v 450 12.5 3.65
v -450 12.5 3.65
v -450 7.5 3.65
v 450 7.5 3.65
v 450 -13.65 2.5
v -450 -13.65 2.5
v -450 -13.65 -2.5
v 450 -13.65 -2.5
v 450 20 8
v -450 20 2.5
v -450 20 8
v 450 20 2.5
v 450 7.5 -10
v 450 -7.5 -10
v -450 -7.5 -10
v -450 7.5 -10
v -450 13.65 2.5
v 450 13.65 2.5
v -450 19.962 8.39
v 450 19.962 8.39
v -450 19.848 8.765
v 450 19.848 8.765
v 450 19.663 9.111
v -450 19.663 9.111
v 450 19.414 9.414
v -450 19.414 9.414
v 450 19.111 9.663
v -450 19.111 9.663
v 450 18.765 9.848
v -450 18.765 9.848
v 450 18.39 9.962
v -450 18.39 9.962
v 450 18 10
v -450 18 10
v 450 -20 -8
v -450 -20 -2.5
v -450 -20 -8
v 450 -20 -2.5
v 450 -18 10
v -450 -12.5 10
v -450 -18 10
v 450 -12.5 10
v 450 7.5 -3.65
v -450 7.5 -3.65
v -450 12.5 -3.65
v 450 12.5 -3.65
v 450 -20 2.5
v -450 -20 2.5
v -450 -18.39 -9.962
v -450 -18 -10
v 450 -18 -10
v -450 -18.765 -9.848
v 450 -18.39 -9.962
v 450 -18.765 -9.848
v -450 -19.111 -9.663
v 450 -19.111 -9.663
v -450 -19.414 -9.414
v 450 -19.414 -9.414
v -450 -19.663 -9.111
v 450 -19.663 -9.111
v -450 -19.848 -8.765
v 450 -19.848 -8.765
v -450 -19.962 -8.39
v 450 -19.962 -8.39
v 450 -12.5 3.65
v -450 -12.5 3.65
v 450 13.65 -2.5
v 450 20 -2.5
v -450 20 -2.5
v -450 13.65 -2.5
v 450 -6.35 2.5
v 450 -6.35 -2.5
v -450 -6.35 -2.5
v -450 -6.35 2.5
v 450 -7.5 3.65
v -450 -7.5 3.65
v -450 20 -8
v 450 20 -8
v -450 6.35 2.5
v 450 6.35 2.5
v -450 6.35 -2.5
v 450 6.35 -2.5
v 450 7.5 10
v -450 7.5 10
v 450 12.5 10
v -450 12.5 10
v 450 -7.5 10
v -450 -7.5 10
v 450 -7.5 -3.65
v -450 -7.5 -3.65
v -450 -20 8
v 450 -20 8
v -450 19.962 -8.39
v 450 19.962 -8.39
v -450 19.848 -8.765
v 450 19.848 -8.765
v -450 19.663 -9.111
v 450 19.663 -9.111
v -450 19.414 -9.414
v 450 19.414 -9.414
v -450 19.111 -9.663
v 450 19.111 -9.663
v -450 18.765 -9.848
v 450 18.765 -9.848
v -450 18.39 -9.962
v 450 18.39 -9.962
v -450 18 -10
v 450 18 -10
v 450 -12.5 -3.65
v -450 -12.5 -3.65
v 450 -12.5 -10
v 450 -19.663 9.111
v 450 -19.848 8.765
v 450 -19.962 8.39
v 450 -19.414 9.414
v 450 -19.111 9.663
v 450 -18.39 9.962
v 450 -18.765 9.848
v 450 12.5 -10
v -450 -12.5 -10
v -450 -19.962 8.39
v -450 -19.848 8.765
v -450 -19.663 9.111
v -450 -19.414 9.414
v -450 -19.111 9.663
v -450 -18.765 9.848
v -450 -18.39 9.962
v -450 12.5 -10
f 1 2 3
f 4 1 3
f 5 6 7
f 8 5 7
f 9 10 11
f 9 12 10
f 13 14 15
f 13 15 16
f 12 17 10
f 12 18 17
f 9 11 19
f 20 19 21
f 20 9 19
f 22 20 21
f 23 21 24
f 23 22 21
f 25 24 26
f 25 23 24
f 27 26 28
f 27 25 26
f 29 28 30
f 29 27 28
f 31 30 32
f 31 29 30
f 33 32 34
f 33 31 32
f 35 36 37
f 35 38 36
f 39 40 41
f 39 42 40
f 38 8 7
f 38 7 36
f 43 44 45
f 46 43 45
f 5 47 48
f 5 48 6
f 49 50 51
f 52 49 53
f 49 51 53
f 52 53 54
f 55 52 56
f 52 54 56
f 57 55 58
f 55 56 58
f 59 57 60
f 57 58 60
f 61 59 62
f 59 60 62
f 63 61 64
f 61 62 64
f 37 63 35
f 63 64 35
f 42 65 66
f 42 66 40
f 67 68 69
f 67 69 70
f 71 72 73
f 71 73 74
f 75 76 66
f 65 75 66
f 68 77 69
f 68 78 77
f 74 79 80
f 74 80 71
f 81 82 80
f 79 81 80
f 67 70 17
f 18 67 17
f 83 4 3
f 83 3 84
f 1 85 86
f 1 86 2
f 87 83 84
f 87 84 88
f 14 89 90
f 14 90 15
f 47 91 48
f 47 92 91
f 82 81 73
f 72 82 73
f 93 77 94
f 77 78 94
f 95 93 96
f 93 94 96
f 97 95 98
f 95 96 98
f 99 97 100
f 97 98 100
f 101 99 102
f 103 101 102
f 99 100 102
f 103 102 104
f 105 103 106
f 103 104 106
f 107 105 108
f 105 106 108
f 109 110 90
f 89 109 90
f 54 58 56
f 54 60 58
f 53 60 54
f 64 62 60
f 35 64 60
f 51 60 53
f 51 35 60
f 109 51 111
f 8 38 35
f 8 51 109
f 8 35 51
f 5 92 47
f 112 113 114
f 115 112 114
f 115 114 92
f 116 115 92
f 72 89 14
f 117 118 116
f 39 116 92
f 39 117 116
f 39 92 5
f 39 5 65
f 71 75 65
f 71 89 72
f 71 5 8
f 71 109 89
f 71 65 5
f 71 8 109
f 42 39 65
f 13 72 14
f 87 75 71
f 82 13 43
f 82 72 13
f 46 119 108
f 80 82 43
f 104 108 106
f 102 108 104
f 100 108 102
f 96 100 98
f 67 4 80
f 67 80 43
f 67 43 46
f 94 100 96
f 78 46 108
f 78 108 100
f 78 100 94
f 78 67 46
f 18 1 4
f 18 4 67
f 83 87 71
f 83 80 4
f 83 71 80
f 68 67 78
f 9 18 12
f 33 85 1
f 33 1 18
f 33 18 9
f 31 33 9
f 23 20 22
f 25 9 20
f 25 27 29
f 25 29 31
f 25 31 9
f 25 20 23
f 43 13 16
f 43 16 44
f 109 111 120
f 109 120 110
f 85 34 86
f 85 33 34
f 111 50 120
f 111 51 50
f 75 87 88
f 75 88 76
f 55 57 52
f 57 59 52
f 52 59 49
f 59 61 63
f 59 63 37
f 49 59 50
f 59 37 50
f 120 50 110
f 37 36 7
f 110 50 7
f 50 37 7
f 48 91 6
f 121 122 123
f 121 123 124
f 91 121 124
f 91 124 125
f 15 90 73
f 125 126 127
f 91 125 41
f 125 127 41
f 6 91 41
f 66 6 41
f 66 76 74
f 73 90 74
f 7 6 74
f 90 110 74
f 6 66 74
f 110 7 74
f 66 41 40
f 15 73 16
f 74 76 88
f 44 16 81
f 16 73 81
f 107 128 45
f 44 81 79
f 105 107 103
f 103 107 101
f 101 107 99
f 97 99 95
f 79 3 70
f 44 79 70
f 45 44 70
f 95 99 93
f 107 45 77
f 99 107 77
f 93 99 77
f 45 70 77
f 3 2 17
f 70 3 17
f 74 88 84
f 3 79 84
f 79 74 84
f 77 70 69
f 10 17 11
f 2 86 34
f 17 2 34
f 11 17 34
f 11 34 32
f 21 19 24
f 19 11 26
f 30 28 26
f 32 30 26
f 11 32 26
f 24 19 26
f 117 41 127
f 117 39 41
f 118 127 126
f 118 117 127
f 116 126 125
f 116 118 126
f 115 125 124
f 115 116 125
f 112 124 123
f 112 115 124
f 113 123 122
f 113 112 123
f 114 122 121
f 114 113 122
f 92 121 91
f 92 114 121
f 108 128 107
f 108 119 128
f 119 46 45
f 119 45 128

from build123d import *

# Parameters (mm, degrees)
F1_DEPTH = 450
F2_W     = 12.7
F2_H     = 5
F3_DEPTH = 900
F4_R     = 2


with BuildPart() as f1:
    # F0 (on Right) → F1 (new body, symmetric)
    with BuildSketch(Plane.YZ):
        Polygon((20, 2.5), (20, 10), (12.5, 10), (12.5, 3.65), (7.5, 3.65), (7.5, 10), (-7.5, 10), (-7.5, 3.65), (-12.5, 3.65), (-12.5, 10), (-20, 10), (-20, 2.5), (-13.65, 2.5), (-13.65, -2.5), (-20, -2.5), (-20, -10), (-12.5, -10), (-12.5, -3.65), (-7.5, -3.65), (-7.5, -10), (7.5, -10), (7.5, -3.65), (12.5, -3.65), (12.5, -10), (20, -10), (20, -2.5), (13.65, -2.5), (13.65, 2.5), align=None)
    extrude(amount=F1_DEPTH, both=True)

    # F2 (on face) → F3 (cut)
    with BuildSketch(Plane(origin=(-450, 0, 0), x_dir=(0, -1, 0), z_dir=(-1, 0, 0))):
        Rectangle(F2_W, F2_H)
    extrude(amount=-F3_DEPTH, mode=Mode.SUBTRACT)

    # F4
    f4_edges = [f1.edges().sort_by_distance(p)[0] for p in [
        (0, 20, 10),
        (0, -20, -10),
        (0, 20, -10),
        (0, -20, 10),
    ]]
    fillet(f4_edges, radius=F4_R)


solid = f1.part
